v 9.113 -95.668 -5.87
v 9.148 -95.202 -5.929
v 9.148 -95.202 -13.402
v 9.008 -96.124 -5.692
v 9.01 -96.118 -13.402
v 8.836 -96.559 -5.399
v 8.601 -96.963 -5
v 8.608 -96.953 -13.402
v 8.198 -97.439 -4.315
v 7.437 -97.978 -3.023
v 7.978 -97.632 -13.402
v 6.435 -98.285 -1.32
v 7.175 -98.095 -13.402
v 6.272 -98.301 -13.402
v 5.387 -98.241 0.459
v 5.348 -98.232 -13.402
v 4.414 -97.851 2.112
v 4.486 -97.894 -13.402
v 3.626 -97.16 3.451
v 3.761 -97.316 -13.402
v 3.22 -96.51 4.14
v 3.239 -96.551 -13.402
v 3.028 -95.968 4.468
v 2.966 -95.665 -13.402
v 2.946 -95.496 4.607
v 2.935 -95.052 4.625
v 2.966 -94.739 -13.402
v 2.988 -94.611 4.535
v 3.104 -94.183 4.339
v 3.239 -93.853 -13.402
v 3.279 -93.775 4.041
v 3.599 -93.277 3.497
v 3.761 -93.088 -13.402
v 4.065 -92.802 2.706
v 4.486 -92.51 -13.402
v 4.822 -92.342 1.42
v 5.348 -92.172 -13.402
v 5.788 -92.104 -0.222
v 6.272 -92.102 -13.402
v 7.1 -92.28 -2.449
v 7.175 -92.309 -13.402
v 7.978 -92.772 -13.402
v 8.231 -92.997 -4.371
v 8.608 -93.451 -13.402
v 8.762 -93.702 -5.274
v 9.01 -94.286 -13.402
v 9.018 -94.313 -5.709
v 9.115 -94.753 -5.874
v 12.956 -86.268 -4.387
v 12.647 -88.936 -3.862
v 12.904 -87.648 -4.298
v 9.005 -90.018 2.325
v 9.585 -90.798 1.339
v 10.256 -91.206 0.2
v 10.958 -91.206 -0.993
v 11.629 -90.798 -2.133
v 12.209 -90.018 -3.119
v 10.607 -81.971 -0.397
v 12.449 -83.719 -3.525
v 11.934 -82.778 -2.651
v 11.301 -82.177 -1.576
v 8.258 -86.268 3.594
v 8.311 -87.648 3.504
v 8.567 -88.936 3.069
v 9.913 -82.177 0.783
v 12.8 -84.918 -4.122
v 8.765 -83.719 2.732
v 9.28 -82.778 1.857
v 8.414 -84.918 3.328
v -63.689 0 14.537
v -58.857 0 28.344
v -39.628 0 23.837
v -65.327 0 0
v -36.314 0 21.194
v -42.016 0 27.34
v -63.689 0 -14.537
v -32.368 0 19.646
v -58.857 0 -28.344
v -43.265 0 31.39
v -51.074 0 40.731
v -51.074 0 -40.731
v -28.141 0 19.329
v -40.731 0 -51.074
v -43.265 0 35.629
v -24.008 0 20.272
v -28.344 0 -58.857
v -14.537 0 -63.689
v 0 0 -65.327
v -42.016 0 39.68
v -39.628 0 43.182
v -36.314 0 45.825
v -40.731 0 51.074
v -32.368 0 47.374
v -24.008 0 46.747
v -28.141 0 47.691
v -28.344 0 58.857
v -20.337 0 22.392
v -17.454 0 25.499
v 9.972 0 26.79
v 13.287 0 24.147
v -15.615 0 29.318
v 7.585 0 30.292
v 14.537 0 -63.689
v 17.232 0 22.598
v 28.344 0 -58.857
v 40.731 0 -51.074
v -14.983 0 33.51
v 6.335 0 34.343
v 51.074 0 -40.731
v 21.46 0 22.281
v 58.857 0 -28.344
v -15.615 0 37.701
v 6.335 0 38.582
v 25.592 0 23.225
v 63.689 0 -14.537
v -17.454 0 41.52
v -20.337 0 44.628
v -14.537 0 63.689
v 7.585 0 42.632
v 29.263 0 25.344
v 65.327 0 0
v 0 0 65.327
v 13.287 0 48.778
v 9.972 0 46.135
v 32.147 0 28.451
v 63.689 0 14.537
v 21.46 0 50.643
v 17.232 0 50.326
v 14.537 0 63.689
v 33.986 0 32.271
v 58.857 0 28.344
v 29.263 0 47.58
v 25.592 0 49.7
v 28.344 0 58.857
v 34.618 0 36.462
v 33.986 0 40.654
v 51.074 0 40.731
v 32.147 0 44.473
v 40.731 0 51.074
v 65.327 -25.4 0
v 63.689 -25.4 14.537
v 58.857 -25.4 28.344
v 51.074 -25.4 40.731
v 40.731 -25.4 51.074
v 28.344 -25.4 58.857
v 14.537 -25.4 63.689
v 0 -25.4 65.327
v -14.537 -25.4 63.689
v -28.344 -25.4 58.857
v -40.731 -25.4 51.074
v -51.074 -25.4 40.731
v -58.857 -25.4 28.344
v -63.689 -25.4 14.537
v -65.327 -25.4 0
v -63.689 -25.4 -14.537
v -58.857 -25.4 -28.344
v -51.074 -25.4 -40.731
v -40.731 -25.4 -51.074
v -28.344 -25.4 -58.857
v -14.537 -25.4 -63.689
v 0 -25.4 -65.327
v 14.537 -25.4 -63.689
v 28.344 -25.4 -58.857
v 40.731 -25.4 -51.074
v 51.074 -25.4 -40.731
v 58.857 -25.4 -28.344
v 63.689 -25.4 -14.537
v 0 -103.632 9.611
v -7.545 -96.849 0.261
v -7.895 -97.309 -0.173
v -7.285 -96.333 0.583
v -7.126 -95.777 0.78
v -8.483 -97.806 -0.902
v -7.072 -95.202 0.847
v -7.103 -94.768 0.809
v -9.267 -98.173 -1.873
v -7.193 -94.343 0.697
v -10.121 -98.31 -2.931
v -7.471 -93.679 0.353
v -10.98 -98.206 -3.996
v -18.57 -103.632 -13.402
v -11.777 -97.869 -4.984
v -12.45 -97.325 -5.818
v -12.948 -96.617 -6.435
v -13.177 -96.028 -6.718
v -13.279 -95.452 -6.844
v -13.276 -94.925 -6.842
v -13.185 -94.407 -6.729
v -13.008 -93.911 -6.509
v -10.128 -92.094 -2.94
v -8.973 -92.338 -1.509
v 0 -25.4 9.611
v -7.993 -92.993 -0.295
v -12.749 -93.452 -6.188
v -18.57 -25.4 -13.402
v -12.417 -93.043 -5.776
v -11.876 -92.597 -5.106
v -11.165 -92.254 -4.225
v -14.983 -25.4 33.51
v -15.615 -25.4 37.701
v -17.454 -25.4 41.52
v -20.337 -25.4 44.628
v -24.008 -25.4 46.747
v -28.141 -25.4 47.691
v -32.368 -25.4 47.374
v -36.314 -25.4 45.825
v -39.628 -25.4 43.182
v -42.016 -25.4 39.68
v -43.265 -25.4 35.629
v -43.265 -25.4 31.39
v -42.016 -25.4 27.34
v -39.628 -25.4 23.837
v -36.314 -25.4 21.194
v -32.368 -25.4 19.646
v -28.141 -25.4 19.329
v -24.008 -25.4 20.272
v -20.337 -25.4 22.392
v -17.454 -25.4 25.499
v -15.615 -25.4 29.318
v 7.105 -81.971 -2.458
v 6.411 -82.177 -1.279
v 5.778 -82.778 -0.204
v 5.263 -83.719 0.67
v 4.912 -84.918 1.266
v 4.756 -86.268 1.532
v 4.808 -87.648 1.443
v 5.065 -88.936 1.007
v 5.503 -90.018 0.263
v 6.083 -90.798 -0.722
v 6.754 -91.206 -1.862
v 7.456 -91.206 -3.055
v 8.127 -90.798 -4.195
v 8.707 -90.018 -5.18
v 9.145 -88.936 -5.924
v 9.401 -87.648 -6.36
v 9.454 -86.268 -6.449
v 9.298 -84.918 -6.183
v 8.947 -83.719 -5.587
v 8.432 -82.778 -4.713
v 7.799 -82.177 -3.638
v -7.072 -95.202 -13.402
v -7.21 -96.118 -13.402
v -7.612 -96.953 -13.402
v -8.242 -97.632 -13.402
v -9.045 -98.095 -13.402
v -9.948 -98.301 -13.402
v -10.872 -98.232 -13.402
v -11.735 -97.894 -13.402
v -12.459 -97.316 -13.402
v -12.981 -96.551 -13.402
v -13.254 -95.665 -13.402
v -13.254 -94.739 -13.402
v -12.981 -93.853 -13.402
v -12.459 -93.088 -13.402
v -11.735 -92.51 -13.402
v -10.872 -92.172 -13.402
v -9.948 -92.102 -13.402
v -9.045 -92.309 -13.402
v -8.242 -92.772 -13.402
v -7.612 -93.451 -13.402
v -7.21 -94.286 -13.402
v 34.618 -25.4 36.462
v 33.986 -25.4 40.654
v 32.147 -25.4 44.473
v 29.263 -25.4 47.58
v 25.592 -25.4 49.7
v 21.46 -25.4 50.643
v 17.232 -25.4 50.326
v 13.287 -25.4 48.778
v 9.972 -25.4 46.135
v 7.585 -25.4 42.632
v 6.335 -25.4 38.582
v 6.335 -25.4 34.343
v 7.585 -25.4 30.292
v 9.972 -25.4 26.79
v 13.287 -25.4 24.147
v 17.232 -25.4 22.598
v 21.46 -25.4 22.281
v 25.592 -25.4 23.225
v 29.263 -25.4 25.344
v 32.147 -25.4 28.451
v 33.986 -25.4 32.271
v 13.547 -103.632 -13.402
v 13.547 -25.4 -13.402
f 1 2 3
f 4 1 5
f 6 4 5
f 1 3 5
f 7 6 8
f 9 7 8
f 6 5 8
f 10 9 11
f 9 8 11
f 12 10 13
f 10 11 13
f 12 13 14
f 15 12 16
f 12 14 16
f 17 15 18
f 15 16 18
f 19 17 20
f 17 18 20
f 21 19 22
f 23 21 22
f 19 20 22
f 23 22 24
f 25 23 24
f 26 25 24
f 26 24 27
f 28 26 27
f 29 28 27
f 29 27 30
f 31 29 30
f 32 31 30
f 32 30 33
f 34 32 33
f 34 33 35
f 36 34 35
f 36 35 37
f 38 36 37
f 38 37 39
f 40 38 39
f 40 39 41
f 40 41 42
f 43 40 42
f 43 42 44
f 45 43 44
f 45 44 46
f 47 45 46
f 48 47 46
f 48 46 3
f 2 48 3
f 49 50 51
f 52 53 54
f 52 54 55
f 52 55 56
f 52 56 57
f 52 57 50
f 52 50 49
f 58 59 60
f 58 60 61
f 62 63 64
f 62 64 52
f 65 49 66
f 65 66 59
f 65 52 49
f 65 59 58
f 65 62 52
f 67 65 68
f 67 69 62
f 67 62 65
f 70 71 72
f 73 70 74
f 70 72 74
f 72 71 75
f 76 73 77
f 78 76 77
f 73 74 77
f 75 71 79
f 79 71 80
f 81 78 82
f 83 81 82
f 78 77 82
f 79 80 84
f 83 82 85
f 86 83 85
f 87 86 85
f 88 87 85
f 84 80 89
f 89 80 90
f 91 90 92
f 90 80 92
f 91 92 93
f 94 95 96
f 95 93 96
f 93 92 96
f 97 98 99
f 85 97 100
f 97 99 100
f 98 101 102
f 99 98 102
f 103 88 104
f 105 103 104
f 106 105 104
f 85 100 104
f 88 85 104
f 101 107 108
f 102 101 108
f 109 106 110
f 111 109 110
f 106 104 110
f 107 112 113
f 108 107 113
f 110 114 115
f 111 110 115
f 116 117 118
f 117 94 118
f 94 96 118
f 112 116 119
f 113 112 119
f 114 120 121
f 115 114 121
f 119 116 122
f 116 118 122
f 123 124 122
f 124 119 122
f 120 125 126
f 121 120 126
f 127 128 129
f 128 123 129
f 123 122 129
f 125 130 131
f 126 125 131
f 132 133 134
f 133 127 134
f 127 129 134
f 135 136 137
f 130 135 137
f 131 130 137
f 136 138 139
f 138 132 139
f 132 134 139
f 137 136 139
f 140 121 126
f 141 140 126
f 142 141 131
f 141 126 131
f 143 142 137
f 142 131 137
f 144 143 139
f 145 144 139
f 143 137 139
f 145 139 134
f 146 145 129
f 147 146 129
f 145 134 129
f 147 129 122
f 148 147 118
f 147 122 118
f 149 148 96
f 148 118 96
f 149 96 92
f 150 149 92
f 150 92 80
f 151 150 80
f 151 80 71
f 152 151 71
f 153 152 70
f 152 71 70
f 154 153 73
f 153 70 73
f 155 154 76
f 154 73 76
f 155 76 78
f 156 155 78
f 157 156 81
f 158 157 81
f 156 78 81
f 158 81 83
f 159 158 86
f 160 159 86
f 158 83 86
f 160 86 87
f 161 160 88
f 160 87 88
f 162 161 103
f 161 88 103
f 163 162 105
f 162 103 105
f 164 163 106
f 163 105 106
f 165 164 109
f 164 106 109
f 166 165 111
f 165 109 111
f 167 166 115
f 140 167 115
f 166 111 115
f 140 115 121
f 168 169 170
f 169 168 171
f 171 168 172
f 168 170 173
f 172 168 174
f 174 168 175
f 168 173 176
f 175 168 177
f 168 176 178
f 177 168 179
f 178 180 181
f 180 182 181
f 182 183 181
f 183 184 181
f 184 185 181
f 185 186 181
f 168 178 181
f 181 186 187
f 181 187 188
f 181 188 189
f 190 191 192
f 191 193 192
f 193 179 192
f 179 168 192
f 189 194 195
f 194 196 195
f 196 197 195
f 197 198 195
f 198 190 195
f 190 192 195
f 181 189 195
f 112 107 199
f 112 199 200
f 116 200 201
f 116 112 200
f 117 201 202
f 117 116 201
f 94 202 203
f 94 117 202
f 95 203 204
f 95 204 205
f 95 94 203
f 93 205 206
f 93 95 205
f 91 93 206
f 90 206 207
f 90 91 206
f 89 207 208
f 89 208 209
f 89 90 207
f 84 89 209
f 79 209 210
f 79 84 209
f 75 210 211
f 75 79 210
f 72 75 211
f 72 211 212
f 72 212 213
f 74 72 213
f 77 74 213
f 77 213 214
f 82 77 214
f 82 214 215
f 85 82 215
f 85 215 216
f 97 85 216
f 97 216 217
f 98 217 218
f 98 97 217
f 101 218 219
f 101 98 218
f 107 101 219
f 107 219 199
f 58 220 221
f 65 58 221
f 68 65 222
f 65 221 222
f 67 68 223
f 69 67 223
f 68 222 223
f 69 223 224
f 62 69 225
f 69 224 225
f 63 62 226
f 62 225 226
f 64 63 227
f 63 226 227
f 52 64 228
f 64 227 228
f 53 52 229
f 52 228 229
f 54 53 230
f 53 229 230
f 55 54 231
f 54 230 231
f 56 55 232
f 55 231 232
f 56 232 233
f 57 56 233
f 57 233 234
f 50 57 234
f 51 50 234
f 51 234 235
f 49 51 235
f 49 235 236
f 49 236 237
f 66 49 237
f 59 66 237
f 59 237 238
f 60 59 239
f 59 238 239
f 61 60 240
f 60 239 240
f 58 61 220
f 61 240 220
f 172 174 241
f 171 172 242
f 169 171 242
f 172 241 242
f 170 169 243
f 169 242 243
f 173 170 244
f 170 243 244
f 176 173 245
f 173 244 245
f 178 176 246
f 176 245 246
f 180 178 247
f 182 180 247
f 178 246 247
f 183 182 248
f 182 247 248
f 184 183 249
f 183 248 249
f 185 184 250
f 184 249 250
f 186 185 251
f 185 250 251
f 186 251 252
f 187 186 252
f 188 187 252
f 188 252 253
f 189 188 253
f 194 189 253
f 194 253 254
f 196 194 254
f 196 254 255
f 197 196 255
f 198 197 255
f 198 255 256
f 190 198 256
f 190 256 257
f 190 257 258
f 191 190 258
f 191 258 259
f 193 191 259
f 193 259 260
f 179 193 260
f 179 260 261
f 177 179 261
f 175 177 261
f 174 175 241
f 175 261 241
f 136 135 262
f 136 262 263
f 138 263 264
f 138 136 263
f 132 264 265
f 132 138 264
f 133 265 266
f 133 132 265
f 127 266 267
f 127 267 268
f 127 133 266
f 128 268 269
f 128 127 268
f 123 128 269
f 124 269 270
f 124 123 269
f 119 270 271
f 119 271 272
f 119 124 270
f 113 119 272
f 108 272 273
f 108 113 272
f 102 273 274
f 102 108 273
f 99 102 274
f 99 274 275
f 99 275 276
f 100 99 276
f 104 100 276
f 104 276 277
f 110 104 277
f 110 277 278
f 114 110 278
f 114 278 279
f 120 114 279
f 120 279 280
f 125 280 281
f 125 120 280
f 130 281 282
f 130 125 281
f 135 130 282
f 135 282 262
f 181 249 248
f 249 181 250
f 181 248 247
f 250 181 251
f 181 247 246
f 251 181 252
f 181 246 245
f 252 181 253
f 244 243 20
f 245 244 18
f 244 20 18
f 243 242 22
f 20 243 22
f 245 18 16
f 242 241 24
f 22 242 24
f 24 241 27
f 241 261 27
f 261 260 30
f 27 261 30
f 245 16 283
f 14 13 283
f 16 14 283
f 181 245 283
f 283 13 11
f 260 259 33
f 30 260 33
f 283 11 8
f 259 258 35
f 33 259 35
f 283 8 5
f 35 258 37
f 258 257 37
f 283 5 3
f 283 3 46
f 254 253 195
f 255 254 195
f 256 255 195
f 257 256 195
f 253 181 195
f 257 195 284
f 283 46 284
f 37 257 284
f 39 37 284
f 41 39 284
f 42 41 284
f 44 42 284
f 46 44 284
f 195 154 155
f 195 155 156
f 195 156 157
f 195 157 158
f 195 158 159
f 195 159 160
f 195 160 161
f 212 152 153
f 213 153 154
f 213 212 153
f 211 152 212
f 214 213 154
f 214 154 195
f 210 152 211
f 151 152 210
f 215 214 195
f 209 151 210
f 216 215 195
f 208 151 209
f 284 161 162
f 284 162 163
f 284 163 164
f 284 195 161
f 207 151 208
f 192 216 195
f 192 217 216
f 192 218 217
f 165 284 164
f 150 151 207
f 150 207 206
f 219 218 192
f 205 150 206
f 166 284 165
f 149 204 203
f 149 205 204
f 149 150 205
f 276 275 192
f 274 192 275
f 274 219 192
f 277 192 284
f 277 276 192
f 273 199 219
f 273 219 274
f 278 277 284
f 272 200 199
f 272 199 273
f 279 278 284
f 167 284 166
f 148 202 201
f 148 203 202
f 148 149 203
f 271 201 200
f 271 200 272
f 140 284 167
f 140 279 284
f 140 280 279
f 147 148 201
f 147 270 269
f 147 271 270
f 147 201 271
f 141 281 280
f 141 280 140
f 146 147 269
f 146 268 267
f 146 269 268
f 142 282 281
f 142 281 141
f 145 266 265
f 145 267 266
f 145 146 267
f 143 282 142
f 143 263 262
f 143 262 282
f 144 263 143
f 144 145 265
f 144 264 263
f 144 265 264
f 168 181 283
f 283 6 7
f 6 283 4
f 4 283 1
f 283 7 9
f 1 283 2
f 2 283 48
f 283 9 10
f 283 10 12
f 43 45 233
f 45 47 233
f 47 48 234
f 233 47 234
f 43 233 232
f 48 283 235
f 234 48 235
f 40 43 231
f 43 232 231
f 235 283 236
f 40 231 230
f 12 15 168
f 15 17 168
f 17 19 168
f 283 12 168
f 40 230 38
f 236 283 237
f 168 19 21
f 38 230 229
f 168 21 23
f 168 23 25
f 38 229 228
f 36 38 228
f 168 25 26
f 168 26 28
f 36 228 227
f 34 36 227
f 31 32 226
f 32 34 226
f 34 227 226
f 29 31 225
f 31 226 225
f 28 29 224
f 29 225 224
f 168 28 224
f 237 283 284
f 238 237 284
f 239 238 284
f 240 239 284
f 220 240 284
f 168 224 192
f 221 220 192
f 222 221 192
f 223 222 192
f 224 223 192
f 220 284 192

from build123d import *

# Parameters (mm, degrees)
F0_R     = 65.3266665863
F0_R_2   = 14.2206371293
F1_DEPTH = 25.4
F3_DEPTH = 78.232
F4_R     = 4.6434374505
F5_DEPTH = 4.064
F6_R     = 3.1082181898
F7_DEPTH = 28.956


with BuildPart() as f1:
    # F0 (on Front) → F1 (new body)
    with BuildSketch(Plane.XZ):
        Circle(F0_R)
        with Locations((-29.2034186423, 33.5097238421)):
            Circle(F0_R_2, mode=Mode.SUBTRACT)
        with Locations((20.3968770802, 36.4621244371)):
            Circle(F0_R_2, mode=Mode.SUBTRACT)
    extrude(amount=F1_DEPTH)

    # F2 (on face) → F3 (join)
    with BuildSketch(Plane.XZ.offset(25.4)):
        Polygon((13.5469222441, -13.4018808603), (0, 9.6108745784), (-18.5700003058, -13.4018808603), align=None)
    extrude(amount=F3_DEPTH)

    # F4 (on face) → F5 (join)
    with BuildSketch(Plane(origin=(4.2016325623, 0, 2.4733756795), x_dir=(0, 1, 0), z_dir=(0.8617703987, 0, 0.5072985117))):
        with Locations((-86.6145864129, -5.7229381055)):
            Circle(F4_R)
    extrude(amount=F5_DEPTH)

    # F6 (on face) → F7 (cut)
    with BuildSketch(Plane(origin=(0, 0, -13.4018808603), x_dir=(1, 0, 0), z_dir=(0, 0, -1))):
        with Locations((-10.1804379374, 95.2019169927)):
            Circle(F6_R)
        with Locations((6.03983727, 95.2019169927)):
            Circle(F6_R)
    extrude(amount=-F7_DEPTH, mode=Mode.SUBTRACT)


solid = f1.part
